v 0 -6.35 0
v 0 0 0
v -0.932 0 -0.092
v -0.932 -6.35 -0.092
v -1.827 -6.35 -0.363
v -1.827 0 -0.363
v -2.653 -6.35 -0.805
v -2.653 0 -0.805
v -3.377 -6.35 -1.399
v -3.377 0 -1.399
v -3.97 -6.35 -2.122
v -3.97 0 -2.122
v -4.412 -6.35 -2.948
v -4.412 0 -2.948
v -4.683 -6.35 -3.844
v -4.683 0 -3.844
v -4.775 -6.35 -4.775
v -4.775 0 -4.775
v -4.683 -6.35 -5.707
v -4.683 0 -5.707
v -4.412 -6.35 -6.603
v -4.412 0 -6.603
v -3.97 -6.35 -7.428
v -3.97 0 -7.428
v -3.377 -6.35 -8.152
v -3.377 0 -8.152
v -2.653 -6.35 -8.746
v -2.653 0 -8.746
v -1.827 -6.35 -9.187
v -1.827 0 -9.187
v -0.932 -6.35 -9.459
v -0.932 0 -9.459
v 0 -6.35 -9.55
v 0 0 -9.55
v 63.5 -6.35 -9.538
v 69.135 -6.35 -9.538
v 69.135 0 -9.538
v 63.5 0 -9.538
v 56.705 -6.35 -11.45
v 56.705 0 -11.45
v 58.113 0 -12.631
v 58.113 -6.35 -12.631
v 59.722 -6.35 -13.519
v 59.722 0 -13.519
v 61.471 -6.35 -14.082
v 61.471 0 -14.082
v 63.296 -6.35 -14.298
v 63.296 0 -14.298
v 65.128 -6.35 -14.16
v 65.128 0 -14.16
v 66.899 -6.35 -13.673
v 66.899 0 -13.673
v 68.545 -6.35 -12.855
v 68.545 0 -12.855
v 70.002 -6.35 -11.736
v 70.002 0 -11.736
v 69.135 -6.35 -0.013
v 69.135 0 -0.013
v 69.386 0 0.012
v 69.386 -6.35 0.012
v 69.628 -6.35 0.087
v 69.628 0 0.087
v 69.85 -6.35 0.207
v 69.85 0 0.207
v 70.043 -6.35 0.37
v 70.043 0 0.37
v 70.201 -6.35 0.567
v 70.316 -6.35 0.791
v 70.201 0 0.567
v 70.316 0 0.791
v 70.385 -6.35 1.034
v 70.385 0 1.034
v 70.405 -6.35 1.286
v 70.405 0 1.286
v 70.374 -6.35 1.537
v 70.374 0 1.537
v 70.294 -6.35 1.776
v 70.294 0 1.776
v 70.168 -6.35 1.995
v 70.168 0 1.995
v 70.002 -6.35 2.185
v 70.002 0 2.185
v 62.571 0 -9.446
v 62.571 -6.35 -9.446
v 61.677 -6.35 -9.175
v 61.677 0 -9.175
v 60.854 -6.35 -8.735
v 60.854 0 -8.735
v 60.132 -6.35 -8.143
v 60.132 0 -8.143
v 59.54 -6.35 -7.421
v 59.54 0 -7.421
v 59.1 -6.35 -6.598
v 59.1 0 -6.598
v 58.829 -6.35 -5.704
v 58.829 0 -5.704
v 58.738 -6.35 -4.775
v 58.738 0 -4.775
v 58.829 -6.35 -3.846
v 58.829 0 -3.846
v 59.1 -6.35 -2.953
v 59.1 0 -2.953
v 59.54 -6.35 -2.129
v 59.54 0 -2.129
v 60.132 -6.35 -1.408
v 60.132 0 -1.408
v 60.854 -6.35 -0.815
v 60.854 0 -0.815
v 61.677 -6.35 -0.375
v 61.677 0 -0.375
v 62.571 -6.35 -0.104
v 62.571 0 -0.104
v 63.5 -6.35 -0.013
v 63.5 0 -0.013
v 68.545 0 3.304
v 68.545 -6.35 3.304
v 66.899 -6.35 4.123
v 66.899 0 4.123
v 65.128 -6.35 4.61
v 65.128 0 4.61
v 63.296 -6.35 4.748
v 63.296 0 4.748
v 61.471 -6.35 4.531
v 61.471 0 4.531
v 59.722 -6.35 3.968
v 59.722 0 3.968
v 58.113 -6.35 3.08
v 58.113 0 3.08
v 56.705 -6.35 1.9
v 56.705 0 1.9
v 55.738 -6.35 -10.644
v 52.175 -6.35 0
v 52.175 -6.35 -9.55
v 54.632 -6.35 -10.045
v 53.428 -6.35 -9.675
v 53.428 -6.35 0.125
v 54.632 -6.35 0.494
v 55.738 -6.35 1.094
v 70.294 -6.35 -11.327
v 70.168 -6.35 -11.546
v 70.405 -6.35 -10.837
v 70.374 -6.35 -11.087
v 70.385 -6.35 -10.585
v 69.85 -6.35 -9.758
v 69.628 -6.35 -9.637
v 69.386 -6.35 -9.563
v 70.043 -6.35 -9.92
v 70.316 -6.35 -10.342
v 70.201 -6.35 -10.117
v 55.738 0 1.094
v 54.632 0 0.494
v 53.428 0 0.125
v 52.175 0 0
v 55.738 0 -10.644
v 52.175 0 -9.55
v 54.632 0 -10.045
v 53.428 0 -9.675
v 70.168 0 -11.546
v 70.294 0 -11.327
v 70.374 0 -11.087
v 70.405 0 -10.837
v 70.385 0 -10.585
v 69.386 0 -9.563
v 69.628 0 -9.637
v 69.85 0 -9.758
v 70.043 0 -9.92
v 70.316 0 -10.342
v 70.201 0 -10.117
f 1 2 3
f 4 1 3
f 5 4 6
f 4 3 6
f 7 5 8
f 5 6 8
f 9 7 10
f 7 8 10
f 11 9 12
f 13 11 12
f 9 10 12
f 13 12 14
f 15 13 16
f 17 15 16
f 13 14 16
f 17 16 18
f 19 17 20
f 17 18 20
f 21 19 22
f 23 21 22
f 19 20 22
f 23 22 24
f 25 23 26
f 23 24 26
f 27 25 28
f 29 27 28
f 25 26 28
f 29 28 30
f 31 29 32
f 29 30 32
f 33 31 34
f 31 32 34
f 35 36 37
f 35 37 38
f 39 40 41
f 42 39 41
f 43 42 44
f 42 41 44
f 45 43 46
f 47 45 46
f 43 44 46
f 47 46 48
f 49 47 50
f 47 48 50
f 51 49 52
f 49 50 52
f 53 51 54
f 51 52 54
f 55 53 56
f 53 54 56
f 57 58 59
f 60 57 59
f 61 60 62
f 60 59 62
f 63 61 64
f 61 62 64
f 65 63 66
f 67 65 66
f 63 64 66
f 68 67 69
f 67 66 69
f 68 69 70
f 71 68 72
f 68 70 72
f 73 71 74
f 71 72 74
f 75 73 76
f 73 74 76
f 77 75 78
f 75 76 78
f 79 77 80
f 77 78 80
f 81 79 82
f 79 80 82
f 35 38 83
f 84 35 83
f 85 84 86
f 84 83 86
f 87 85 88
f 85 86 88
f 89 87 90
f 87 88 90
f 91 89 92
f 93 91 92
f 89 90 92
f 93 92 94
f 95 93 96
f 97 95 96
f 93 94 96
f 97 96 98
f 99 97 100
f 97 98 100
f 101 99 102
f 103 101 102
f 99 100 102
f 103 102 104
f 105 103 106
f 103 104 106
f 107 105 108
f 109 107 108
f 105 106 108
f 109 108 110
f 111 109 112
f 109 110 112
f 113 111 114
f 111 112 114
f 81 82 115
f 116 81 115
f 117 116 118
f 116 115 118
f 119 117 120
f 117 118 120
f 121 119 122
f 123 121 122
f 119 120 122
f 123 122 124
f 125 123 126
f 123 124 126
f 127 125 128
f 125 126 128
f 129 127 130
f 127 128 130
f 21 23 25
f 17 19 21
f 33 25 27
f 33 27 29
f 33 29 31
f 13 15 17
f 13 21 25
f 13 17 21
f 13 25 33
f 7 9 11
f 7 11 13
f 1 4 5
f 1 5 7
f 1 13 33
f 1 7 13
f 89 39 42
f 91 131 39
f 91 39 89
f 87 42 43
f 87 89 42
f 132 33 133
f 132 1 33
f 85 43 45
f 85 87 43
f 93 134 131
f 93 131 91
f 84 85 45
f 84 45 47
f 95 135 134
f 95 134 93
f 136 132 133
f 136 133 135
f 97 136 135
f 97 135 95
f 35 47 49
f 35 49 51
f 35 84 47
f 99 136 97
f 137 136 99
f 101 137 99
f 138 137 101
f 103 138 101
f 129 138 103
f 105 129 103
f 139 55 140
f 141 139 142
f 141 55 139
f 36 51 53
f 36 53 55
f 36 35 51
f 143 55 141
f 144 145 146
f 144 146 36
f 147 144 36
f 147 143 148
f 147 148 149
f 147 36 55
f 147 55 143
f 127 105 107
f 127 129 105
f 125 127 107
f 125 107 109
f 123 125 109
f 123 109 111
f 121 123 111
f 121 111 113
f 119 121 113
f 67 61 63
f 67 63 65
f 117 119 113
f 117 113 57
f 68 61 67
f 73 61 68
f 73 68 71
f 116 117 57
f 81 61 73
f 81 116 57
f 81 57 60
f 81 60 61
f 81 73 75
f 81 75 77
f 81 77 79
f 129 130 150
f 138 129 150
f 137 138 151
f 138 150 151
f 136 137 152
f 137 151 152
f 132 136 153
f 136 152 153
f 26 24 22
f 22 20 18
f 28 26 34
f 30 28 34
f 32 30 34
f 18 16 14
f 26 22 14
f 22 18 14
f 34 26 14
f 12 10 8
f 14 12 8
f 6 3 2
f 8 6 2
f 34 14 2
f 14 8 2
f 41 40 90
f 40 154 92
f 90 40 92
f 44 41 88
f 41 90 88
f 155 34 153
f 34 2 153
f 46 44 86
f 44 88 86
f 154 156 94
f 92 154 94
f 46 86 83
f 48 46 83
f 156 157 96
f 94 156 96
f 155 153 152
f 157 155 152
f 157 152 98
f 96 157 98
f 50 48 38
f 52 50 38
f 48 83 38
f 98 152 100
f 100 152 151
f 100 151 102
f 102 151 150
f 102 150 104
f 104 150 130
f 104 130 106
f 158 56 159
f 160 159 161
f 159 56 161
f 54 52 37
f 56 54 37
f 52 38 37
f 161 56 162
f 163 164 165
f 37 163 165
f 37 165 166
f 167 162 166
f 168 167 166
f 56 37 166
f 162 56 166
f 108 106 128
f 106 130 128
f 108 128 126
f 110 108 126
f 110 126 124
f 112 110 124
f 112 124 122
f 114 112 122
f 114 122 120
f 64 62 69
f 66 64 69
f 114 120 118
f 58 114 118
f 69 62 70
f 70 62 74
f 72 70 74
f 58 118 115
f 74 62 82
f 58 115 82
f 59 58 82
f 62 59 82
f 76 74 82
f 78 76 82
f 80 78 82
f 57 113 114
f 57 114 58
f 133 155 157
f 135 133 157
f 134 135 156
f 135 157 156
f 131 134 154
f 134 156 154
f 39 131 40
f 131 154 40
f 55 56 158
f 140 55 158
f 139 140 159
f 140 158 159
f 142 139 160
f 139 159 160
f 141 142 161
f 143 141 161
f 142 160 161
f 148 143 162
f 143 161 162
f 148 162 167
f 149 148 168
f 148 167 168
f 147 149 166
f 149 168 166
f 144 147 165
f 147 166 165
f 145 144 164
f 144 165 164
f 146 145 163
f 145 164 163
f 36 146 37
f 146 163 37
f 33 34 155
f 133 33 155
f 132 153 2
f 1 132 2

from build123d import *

# Parameters (mm, degrees)
F1_DEPTH = 6.35


with BuildPart() as f1:
    # F0 (on Front) → F1 (new body)
    with BuildSketch(Plane.XZ):
        with BuildLine():
            Line((52.175445, 0), (0, 0))
            ThreePointArc((0, 0), (-4.7752, -4.7752), (0, -9.5504))
            Line((0, -9.5504), (52.175445, -9.5504))
            ThreePointArc((52.175445, -9.5504), (54.631508, -10.044612), (56.705267, -11.45032))
            ThreePointArc((56.705267, -11.45032), (63.295562, -14.298006), (70.001999, -11.735777))
            ThreePointArc((70.001999, -11.735777), (70.316497, -10.341737), (69.135066, -9.5377))
            Line((69.135066, -9.5377), (63.5, -9.5377))
            ThreePointArc((63.5, -9.5377), (58.7375, -4.7752), (63.5, -0.0127))
            Line((63.5, -0.0127), (69.135066, -0.0127))
            ThreePointArc((69.135066, -0.0127), (70.316497, 0.791337), (70.001999, 2.185377))
            ThreePointArc((70.001999, 2.185377), (63.295562, 4.747606), (56.705267, 1.89992))
            ThreePointArc((56.705267, 1.89992), (54.631508, 0.494212), (52.175445, 0))
        make_face()
    extrude(amount=F1_DEPTH)


solid = f1.part
